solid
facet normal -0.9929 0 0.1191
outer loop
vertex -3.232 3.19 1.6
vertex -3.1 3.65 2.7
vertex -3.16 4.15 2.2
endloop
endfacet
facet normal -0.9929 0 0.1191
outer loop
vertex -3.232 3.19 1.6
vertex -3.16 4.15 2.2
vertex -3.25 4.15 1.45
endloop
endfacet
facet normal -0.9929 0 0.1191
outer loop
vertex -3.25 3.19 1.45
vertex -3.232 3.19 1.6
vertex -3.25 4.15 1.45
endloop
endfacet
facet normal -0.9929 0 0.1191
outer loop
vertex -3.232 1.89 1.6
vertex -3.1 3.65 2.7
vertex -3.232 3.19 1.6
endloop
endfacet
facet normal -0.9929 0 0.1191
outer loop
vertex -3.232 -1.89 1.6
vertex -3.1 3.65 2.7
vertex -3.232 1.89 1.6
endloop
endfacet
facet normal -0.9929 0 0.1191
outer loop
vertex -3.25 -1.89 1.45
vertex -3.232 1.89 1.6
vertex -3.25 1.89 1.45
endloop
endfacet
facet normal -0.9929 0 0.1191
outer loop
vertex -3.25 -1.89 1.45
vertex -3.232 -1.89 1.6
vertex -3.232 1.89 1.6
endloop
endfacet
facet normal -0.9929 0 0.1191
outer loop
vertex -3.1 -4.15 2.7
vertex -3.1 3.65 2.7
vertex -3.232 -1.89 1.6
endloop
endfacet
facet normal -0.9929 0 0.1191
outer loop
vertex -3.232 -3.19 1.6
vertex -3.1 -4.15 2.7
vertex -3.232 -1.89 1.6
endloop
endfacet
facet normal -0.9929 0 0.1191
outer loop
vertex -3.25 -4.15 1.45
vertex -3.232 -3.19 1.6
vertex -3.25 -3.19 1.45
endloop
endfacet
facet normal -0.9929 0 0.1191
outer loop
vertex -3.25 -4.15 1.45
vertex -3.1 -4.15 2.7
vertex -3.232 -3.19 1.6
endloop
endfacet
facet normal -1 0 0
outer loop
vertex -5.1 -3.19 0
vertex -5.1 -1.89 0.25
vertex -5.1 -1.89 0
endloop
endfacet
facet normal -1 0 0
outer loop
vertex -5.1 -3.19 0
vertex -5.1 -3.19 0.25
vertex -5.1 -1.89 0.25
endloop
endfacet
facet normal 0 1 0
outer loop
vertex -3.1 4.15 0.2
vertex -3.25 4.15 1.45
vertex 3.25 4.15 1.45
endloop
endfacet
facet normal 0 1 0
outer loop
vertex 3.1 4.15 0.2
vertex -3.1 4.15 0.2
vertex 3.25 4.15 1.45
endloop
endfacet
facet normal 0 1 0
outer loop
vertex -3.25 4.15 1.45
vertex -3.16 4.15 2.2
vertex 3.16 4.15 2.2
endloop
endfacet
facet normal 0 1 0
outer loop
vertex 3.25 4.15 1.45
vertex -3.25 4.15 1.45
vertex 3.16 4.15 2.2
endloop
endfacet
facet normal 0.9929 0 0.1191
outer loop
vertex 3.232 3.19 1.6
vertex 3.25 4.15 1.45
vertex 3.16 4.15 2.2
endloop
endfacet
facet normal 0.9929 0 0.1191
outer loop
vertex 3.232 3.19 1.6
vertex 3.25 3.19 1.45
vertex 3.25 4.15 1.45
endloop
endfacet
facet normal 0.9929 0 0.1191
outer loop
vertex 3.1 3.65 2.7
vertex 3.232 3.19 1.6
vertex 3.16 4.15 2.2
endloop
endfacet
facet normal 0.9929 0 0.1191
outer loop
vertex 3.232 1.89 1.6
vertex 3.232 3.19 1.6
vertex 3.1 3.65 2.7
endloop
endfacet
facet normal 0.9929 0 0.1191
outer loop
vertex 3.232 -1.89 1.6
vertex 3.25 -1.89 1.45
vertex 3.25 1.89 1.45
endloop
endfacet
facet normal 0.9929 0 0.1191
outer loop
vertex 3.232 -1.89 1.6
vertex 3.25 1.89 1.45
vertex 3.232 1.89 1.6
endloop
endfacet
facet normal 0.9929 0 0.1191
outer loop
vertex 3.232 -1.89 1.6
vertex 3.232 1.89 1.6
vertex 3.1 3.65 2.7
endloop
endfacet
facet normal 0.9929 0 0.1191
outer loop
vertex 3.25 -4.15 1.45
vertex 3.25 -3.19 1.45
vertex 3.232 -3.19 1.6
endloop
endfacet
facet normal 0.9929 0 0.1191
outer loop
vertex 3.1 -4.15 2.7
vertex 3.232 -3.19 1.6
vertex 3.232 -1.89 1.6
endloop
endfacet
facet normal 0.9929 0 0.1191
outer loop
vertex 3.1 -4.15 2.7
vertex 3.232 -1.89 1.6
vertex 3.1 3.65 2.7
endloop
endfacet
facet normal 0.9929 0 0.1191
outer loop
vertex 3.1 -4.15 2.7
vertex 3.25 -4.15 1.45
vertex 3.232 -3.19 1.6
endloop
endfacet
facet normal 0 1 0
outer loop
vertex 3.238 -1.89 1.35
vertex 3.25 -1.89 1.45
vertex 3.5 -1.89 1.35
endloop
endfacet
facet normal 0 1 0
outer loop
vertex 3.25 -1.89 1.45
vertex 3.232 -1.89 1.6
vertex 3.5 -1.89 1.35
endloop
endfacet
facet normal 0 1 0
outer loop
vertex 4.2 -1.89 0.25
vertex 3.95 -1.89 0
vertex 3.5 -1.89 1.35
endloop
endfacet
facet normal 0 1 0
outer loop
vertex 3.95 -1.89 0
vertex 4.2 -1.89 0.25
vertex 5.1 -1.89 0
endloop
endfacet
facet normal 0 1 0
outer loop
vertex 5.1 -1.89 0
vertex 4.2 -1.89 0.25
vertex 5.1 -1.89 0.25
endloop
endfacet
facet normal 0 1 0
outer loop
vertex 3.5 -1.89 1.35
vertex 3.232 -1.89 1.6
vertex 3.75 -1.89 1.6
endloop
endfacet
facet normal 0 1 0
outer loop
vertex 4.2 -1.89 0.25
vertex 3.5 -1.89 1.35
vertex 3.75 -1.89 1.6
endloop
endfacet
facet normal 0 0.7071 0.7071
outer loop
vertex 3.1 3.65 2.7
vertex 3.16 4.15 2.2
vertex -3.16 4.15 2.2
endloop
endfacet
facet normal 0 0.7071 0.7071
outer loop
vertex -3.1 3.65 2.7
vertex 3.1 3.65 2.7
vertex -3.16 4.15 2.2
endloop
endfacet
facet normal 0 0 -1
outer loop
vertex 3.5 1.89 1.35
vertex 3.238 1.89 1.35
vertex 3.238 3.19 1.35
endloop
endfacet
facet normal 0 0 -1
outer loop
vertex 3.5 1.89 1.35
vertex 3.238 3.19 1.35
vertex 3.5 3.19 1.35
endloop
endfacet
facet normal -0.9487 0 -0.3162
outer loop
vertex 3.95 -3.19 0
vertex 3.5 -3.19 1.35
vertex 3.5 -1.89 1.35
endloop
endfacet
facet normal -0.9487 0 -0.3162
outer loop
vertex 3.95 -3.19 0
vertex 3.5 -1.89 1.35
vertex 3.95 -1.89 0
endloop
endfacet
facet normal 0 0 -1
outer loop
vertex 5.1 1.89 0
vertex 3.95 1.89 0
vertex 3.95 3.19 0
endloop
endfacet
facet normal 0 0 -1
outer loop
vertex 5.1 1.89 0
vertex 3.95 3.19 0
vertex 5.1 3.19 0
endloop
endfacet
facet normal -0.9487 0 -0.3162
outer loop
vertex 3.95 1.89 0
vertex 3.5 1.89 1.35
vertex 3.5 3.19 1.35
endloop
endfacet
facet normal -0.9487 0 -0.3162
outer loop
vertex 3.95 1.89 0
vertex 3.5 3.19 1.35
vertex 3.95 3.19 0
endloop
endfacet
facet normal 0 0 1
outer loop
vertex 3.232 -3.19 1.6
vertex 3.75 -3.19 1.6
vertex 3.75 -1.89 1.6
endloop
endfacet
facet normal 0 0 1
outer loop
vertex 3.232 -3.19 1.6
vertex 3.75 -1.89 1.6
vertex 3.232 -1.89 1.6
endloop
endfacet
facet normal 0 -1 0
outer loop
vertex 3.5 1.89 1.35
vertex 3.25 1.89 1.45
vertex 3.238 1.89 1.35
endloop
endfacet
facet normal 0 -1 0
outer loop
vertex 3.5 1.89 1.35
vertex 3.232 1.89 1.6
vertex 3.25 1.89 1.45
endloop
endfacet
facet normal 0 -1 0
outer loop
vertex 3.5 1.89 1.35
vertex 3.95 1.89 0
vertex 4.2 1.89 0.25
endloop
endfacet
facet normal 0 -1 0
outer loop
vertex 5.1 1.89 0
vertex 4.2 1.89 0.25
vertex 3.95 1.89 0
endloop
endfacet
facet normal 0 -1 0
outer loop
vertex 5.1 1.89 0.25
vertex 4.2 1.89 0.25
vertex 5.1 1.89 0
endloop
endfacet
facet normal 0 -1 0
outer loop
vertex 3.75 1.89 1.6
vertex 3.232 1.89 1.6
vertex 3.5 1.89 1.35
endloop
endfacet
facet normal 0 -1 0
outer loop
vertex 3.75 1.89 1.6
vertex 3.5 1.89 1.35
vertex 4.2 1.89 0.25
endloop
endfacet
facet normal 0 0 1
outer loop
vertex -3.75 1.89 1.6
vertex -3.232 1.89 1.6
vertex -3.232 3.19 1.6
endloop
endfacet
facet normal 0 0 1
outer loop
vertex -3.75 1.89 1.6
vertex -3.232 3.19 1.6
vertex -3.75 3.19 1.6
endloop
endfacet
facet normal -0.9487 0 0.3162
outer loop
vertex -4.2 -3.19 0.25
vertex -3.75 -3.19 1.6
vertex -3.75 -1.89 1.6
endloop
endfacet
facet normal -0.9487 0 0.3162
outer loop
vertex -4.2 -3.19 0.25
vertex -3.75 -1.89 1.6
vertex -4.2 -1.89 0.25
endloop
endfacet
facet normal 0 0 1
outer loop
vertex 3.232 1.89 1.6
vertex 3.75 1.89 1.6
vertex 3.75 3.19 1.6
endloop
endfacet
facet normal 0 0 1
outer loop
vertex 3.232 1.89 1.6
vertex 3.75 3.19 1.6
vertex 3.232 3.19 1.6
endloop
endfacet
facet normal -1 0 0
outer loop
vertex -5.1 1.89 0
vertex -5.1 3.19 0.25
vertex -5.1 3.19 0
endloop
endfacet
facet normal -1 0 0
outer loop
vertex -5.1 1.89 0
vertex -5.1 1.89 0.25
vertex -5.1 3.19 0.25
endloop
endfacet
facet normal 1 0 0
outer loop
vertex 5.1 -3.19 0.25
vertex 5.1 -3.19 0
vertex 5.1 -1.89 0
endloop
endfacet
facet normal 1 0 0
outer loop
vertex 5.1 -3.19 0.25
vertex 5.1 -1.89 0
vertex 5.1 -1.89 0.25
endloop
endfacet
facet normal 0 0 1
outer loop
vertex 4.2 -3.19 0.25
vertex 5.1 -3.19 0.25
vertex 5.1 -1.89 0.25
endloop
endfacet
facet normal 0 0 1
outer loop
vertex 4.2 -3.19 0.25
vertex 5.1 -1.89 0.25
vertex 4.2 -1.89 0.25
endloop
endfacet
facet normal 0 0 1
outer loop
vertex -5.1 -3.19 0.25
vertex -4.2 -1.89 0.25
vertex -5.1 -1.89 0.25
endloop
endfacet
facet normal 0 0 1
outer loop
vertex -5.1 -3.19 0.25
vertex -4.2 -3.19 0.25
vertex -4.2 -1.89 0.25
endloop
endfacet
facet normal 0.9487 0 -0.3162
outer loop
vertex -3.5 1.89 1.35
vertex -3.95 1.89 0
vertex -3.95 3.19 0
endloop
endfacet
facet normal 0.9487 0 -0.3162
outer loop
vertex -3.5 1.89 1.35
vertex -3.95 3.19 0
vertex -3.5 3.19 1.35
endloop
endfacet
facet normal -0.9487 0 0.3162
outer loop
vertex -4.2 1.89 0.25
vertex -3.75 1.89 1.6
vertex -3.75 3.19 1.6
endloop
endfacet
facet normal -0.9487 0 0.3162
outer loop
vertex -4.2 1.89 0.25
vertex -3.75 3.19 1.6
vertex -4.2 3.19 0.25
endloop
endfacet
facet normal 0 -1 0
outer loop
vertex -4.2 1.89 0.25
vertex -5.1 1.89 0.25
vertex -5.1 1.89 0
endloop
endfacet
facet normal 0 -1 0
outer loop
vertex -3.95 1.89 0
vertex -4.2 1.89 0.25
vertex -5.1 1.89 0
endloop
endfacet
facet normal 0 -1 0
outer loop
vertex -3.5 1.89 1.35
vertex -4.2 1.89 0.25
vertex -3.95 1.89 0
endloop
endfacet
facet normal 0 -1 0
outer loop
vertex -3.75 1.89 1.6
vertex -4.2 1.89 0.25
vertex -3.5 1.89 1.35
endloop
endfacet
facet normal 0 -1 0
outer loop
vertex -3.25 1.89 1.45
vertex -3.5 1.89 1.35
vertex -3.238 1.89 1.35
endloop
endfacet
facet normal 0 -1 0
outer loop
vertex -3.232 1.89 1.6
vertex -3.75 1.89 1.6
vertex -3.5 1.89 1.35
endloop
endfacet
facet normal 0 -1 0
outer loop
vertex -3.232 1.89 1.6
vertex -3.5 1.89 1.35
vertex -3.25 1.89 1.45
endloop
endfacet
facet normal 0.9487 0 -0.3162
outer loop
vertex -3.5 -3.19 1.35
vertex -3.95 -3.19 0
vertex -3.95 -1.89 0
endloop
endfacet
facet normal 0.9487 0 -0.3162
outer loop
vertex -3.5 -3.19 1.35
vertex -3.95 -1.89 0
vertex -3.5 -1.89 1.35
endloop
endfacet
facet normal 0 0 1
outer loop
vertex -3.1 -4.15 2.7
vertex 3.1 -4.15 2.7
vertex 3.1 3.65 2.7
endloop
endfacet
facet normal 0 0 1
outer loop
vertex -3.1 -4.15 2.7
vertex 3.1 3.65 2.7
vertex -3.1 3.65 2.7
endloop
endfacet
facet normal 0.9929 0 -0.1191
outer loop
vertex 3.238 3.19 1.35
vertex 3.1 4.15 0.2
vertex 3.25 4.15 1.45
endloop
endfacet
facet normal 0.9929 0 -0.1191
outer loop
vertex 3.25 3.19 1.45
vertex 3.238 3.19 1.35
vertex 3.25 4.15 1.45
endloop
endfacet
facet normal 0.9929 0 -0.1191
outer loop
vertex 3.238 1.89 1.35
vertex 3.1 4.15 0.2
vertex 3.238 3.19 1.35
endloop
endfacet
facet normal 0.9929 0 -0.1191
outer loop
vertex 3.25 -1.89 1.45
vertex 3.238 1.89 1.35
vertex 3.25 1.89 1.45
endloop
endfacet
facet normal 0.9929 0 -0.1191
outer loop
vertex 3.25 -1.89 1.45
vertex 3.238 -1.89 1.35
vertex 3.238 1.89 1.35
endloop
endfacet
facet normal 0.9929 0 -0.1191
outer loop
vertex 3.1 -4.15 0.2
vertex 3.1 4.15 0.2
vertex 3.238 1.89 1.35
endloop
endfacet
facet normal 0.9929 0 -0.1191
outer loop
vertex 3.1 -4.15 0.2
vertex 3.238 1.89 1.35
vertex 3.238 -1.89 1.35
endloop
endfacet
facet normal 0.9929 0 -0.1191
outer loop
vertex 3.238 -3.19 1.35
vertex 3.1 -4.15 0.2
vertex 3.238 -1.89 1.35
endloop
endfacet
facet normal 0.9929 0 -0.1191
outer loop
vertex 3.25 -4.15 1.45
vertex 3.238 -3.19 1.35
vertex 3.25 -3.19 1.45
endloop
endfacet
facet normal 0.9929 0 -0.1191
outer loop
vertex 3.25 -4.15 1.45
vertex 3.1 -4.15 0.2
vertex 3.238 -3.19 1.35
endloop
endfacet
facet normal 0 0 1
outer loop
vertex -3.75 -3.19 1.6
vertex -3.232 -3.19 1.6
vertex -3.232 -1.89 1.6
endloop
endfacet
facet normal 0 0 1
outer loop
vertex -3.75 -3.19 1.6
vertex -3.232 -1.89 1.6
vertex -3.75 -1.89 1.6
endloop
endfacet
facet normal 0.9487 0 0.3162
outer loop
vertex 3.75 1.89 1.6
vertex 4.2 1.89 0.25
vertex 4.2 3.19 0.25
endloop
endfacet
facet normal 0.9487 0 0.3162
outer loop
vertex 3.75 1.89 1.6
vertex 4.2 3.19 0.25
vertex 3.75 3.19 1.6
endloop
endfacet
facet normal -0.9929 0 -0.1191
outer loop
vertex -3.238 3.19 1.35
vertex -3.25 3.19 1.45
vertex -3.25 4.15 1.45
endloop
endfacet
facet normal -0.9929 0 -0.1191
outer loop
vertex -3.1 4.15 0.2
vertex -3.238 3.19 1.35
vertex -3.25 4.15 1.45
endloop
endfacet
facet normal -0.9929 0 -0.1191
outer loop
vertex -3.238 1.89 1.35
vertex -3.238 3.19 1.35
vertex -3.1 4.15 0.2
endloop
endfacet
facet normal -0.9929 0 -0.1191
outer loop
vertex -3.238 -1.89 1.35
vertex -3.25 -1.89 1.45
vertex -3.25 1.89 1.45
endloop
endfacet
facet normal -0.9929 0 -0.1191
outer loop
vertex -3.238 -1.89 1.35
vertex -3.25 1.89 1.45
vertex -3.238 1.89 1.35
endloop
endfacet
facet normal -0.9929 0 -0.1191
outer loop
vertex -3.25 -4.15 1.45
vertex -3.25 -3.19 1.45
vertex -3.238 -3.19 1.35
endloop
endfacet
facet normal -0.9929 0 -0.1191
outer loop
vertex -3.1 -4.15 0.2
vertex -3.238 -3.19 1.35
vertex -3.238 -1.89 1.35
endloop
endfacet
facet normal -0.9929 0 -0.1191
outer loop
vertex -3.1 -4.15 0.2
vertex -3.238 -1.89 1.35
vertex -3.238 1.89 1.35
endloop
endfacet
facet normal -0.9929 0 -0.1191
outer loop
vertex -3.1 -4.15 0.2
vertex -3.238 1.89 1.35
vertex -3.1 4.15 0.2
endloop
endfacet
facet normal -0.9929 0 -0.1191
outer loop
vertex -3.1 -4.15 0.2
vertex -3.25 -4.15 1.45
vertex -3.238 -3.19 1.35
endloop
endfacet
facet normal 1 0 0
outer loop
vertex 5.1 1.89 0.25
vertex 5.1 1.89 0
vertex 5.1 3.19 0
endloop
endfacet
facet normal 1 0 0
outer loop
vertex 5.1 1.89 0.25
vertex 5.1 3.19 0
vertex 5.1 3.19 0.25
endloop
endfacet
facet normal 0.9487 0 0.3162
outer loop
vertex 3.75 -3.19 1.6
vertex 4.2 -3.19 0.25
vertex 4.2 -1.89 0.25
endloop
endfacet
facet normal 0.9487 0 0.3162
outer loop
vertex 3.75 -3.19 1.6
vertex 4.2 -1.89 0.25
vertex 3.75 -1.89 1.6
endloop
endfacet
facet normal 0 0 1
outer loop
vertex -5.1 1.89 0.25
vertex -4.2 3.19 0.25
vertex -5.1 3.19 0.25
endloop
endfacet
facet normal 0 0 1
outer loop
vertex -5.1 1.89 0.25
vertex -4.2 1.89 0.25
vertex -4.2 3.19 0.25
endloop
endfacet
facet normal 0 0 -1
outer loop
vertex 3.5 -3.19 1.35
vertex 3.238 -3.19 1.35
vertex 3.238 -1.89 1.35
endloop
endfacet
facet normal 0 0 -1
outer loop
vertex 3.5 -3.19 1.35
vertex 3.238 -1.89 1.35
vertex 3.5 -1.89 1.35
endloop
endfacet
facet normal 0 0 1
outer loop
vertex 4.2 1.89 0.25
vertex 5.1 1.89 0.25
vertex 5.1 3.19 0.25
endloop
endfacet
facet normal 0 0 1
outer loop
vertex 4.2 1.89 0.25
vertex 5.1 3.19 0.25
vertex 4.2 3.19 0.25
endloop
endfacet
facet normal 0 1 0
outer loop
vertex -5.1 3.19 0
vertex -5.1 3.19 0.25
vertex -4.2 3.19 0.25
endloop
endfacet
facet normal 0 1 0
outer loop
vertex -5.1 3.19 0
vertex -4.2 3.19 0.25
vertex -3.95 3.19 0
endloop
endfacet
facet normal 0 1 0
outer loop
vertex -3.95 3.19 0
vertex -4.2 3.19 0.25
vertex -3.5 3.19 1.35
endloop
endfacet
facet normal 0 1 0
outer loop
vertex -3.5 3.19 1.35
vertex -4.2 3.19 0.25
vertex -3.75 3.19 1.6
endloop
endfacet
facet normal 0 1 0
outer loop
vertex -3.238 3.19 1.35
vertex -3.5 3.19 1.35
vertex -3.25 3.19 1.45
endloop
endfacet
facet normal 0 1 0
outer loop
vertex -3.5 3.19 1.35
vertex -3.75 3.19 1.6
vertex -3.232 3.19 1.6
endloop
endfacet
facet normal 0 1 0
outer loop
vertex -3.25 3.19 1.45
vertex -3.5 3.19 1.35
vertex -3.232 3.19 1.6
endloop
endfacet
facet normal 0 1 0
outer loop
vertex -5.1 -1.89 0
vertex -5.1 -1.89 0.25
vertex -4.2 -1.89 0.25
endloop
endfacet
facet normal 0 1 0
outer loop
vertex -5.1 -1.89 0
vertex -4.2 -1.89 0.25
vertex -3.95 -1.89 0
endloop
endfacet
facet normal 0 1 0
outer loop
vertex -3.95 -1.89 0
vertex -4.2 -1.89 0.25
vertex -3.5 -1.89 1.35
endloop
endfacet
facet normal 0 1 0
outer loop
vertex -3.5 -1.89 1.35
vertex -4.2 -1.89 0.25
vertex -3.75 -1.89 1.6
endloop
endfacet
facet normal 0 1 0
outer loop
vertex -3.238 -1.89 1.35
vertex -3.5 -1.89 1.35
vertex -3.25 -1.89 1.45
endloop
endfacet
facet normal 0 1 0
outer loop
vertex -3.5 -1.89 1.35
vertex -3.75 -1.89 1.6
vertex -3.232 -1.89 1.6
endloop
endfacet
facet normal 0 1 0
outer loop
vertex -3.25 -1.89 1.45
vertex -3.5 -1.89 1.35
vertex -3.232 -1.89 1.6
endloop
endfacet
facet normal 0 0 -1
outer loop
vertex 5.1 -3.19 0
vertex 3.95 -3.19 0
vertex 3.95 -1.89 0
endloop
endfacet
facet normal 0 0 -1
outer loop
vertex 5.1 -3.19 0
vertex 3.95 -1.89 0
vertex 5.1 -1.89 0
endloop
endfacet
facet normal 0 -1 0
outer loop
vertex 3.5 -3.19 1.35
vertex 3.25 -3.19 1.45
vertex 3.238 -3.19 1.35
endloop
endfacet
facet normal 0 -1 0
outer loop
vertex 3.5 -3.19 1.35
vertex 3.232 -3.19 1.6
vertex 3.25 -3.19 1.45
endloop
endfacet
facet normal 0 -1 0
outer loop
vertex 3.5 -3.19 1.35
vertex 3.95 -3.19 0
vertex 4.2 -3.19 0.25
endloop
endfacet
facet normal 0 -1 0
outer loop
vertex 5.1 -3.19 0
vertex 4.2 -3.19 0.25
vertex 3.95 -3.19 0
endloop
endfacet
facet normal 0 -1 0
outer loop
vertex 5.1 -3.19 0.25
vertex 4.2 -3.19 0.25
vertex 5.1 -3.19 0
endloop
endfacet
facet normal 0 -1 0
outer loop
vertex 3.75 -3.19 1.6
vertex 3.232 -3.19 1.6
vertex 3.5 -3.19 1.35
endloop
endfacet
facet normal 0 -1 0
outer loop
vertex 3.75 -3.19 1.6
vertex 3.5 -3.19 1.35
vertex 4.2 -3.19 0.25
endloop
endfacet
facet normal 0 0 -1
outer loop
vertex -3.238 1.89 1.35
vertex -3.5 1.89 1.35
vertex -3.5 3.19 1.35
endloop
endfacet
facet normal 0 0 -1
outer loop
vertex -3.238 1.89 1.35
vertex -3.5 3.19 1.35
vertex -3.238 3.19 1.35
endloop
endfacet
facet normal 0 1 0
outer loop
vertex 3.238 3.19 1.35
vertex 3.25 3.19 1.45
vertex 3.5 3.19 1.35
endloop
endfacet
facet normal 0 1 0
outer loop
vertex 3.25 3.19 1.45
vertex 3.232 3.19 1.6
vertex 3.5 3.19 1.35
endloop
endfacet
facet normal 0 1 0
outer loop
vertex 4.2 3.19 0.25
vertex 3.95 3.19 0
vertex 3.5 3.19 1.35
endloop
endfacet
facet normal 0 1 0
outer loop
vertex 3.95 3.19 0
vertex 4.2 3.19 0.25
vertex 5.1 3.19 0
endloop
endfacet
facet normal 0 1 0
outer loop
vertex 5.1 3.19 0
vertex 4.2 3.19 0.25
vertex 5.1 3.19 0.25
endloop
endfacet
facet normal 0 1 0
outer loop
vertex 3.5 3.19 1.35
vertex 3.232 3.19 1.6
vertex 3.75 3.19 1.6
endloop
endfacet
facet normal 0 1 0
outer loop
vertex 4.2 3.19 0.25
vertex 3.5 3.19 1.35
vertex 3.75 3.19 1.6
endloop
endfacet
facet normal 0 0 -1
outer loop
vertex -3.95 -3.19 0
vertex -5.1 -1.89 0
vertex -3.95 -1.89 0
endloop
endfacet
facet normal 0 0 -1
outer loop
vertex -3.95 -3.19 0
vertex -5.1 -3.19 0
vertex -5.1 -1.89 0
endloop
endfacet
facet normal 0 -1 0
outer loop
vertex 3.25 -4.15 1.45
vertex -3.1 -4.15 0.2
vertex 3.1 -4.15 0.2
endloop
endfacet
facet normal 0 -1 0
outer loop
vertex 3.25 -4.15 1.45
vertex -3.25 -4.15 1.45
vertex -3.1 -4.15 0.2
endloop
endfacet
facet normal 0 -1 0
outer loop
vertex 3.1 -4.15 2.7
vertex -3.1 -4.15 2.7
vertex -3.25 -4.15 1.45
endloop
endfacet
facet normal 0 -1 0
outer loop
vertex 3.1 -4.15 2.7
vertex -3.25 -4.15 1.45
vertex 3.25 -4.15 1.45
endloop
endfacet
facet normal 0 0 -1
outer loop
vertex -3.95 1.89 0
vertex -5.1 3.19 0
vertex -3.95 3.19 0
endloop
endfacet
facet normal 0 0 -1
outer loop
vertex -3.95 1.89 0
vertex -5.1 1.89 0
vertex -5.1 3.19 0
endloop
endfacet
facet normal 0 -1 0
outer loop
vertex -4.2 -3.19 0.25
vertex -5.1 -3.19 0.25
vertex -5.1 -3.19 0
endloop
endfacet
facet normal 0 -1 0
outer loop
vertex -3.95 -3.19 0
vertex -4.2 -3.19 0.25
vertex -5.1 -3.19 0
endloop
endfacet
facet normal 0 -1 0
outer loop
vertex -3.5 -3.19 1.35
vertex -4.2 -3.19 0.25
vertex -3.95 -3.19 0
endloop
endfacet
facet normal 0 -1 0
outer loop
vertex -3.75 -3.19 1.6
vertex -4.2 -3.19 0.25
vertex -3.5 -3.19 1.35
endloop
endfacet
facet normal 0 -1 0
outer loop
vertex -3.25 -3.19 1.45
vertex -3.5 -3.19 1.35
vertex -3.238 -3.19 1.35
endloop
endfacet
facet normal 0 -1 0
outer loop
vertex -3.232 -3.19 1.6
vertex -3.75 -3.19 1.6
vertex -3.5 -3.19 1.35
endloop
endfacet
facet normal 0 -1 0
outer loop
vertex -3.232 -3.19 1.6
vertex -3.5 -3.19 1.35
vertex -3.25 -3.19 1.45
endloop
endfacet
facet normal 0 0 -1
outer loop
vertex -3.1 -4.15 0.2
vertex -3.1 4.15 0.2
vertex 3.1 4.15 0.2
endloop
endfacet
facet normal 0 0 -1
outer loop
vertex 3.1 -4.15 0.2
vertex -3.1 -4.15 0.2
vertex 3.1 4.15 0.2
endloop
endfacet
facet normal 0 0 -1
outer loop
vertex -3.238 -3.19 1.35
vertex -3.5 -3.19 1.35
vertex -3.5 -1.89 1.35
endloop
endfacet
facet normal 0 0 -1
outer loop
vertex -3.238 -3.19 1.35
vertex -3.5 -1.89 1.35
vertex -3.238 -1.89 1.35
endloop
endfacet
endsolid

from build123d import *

# Parameters (mm, degrees)
PAD002_DEPTH = 0.65
PAD003_DEPTH = 0.65
PAD_DEPTH    = 4.15
CHAMFER_SIZE = 0.5


with BuildPart() as pad002:
    # Sketch002 → Pad002 (new body, symmetric)
    with BuildSketch(Plane.XZ.offset(-2.54)):
        Polygon((-5.1, 0), (-3.95, 0), (-3.5, 1.35), (3.5, 1.35), (3.95, 0), (5.1, 0), (5.1, 0.25), (4.2, 0.25), (3.75, 1.6), (-3.75, 1.6), (-4.2, 0.25), (-5.1, 0.25), align=None)
    extrude(amount=PAD002_DEPTH, both=True)


with BuildPart() as pad003:
    # Sketch003 → Pad003 (new body, symmetric)
    with BuildSketch(Plane.XZ.offset(2.54)):
        Polygon((-5.1, 0), (-3.95, 0), (-3.5, 1.35), (3.5, 1.35), (3.95, 0), (5.1, 0), (5.1, 0.25), (4.2, 0.25), (3.75, 1.6), (-3.75, 1.6), (-4.2, 0.25), (-5.1, 0.25), align=None)
    extrude(amount=PAD003_DEPTH, both=True)


with BuildPart() as diode_bridge_diotec_so_dil_slim:
    # Sketch → Pad (new body, symmetric)
    with BuildSketch(Plane.XZ):
        Polygon((-3.1, 0.2), (3.1, 0.2), (3.25, 1.45), (3.1, 2.7), (-3.1, 2.7), (-3.25, 1.45), align=None)
    extrude(amount=PAD_DEPTH, both=True)

    # Chamfer
    chamfer_edges = [diode_bridge_diotec_so_dil_slim.edges().sort_by_distance(p)[0] for p in [
        (0, 4.15, 2.7),
    ]]
    chamfer(chamfer_edges, length=CHAMFER_SIZE)

    # Chamfer_mp_cp: union Pad002, Pad003
    add(pad002.part)
    add(pad003.part)


solid = diode_bridge_diotec_so_dil_slim.part
